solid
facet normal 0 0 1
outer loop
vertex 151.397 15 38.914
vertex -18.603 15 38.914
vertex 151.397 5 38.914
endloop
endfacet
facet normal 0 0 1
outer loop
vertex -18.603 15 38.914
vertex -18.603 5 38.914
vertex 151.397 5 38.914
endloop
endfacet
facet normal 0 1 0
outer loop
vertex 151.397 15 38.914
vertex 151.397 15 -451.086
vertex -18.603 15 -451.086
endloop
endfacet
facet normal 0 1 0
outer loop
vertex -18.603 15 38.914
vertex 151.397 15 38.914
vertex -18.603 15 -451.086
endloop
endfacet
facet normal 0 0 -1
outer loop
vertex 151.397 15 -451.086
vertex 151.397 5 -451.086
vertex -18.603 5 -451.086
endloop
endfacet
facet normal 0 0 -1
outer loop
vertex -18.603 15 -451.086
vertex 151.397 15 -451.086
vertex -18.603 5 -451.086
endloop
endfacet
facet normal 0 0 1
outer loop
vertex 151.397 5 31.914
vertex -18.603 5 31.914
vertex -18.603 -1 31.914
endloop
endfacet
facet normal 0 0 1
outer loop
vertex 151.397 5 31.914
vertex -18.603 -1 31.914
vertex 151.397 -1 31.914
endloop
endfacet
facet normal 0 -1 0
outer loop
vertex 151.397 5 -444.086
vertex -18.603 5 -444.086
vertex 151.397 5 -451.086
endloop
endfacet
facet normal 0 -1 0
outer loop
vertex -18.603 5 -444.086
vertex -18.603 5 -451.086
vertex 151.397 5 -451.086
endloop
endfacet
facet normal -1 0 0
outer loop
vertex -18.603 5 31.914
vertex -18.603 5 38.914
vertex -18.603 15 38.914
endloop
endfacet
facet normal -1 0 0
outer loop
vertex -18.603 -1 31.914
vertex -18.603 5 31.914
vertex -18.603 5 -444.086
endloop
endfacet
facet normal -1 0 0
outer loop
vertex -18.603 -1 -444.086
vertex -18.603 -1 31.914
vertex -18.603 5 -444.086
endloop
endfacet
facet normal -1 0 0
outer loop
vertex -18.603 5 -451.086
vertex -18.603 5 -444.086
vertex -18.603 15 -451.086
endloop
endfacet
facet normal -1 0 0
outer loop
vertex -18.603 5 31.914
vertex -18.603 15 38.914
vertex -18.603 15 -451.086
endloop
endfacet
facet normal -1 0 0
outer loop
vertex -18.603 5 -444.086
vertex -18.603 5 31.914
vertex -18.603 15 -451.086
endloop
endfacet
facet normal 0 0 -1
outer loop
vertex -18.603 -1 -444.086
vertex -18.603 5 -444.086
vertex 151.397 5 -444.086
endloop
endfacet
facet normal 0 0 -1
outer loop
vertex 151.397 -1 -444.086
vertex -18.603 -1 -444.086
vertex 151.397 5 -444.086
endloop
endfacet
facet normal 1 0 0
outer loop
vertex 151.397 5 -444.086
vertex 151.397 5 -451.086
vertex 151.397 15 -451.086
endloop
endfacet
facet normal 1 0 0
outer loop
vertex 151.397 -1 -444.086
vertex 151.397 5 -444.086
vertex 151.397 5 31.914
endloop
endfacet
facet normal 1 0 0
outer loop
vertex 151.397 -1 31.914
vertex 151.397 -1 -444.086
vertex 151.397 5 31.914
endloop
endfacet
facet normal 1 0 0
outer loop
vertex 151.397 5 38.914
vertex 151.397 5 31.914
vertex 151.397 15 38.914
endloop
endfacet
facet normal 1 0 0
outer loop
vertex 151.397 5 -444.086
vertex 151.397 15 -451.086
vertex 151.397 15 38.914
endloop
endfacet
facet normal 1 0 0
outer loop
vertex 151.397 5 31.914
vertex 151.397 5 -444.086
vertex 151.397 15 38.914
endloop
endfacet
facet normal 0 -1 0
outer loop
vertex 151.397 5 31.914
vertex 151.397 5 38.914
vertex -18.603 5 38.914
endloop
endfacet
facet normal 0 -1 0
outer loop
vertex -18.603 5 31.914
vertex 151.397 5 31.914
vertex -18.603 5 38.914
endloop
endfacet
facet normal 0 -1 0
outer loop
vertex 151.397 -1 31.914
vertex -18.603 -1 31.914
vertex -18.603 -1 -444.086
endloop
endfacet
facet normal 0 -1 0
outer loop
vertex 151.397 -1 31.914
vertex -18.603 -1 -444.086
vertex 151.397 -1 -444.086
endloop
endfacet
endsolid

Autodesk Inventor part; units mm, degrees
ref_plane "YZ Plane" through (0, 0, 0) normal (1, 0, 0) x (0, 1, 0)
ref_plane "XZ Plane" through (0, 0, 0) normal (0, 1, 0) x (-1, 0, 0)
ref_plane "XY Plane" through (0, 0, 0) normal (0, 0, 1) x (1, 0, 0)
sketch "Sketch1" plane through (0, 0, 0) normal (0, 1, 0) x (-1, 0, 0)
  line L0 (18.603, 38.914) -> (-151.397, 38.914)
  line L1 (-151.397, 38.914) -> (-151.397, -451.086)
  line L2 (-151.397, -451.086) -> (18.603, -451.086)
  line L3 (18.603, -451.086) -> (18.603, 38.914)
  point P0 (0, 0)
  dimension "d0" = 170
  dimension "d1" = 490
extrude "Extrusion1" add sketch "Sketch1" along normal blind 15
sketch "Sketch2" plane through (-18.603, 0, 38.914) normal (0, 0, 1) x (1, 0, 0)
  line L0 (170, 0) -> (0, 0) projected
  line L1 (0, 0) -> (170, 0)
  line L2 (170, 0) -> (170, 5)
  line L3 (170, 5) -> (0, 5)
  line L4 (0, 5) -> (0, 0)
  point P0 (18.603, 0)
  dimension "d4" = 170
  dimension "d5" = 5
extrude "Extrusion2" cut sketch "Sketch2" against normal blind 7
sketch "Sketch3" plane through (151.397, 0, -451.086) normal (0, 0, -1) x (-1, 0, 0)
  line L0 (0, 0) -> (170, 0) projected
  line L1 (0, 0) -> (170, 0)
  line L2 (170, 0) -> (170, 5)
  line L3 (170, 5) -> (0, 5)
  line L4 (0, 5) -> (0, 0)
  point P0 (151.397, 0)
  dimension "d8" = 170
  dimension "d9" = 5
extrude "Extrusion3" cut sketch "Sketch3" against normal blind 7
sketch "Sketch4" plane through (0, 0, 0) normal (0, -1, 0) x (1, 0, 0)
  line L0 (-18.603, -444.086) -> (151.397, -444.086) projected
  line L1 (-18.603, 31.914) -> (151.397, 31.914) projected
  line L2 (-18.603, -444.086) -> (151.397, -444.086)
  line L3 (151.397, -444.086) -> (151.397, 31.914)
  line L4 (151.397, 31.914) -> (-18.603, 31.914)
  line L5 (-18.603, 31.914) -> (-18.603, -444.086)
  point P0 (0, 0)
extrude "Extrusion4" add sketch "Sketch4" along normal blind 1
properties part number "Arcade_MonitorMount"
